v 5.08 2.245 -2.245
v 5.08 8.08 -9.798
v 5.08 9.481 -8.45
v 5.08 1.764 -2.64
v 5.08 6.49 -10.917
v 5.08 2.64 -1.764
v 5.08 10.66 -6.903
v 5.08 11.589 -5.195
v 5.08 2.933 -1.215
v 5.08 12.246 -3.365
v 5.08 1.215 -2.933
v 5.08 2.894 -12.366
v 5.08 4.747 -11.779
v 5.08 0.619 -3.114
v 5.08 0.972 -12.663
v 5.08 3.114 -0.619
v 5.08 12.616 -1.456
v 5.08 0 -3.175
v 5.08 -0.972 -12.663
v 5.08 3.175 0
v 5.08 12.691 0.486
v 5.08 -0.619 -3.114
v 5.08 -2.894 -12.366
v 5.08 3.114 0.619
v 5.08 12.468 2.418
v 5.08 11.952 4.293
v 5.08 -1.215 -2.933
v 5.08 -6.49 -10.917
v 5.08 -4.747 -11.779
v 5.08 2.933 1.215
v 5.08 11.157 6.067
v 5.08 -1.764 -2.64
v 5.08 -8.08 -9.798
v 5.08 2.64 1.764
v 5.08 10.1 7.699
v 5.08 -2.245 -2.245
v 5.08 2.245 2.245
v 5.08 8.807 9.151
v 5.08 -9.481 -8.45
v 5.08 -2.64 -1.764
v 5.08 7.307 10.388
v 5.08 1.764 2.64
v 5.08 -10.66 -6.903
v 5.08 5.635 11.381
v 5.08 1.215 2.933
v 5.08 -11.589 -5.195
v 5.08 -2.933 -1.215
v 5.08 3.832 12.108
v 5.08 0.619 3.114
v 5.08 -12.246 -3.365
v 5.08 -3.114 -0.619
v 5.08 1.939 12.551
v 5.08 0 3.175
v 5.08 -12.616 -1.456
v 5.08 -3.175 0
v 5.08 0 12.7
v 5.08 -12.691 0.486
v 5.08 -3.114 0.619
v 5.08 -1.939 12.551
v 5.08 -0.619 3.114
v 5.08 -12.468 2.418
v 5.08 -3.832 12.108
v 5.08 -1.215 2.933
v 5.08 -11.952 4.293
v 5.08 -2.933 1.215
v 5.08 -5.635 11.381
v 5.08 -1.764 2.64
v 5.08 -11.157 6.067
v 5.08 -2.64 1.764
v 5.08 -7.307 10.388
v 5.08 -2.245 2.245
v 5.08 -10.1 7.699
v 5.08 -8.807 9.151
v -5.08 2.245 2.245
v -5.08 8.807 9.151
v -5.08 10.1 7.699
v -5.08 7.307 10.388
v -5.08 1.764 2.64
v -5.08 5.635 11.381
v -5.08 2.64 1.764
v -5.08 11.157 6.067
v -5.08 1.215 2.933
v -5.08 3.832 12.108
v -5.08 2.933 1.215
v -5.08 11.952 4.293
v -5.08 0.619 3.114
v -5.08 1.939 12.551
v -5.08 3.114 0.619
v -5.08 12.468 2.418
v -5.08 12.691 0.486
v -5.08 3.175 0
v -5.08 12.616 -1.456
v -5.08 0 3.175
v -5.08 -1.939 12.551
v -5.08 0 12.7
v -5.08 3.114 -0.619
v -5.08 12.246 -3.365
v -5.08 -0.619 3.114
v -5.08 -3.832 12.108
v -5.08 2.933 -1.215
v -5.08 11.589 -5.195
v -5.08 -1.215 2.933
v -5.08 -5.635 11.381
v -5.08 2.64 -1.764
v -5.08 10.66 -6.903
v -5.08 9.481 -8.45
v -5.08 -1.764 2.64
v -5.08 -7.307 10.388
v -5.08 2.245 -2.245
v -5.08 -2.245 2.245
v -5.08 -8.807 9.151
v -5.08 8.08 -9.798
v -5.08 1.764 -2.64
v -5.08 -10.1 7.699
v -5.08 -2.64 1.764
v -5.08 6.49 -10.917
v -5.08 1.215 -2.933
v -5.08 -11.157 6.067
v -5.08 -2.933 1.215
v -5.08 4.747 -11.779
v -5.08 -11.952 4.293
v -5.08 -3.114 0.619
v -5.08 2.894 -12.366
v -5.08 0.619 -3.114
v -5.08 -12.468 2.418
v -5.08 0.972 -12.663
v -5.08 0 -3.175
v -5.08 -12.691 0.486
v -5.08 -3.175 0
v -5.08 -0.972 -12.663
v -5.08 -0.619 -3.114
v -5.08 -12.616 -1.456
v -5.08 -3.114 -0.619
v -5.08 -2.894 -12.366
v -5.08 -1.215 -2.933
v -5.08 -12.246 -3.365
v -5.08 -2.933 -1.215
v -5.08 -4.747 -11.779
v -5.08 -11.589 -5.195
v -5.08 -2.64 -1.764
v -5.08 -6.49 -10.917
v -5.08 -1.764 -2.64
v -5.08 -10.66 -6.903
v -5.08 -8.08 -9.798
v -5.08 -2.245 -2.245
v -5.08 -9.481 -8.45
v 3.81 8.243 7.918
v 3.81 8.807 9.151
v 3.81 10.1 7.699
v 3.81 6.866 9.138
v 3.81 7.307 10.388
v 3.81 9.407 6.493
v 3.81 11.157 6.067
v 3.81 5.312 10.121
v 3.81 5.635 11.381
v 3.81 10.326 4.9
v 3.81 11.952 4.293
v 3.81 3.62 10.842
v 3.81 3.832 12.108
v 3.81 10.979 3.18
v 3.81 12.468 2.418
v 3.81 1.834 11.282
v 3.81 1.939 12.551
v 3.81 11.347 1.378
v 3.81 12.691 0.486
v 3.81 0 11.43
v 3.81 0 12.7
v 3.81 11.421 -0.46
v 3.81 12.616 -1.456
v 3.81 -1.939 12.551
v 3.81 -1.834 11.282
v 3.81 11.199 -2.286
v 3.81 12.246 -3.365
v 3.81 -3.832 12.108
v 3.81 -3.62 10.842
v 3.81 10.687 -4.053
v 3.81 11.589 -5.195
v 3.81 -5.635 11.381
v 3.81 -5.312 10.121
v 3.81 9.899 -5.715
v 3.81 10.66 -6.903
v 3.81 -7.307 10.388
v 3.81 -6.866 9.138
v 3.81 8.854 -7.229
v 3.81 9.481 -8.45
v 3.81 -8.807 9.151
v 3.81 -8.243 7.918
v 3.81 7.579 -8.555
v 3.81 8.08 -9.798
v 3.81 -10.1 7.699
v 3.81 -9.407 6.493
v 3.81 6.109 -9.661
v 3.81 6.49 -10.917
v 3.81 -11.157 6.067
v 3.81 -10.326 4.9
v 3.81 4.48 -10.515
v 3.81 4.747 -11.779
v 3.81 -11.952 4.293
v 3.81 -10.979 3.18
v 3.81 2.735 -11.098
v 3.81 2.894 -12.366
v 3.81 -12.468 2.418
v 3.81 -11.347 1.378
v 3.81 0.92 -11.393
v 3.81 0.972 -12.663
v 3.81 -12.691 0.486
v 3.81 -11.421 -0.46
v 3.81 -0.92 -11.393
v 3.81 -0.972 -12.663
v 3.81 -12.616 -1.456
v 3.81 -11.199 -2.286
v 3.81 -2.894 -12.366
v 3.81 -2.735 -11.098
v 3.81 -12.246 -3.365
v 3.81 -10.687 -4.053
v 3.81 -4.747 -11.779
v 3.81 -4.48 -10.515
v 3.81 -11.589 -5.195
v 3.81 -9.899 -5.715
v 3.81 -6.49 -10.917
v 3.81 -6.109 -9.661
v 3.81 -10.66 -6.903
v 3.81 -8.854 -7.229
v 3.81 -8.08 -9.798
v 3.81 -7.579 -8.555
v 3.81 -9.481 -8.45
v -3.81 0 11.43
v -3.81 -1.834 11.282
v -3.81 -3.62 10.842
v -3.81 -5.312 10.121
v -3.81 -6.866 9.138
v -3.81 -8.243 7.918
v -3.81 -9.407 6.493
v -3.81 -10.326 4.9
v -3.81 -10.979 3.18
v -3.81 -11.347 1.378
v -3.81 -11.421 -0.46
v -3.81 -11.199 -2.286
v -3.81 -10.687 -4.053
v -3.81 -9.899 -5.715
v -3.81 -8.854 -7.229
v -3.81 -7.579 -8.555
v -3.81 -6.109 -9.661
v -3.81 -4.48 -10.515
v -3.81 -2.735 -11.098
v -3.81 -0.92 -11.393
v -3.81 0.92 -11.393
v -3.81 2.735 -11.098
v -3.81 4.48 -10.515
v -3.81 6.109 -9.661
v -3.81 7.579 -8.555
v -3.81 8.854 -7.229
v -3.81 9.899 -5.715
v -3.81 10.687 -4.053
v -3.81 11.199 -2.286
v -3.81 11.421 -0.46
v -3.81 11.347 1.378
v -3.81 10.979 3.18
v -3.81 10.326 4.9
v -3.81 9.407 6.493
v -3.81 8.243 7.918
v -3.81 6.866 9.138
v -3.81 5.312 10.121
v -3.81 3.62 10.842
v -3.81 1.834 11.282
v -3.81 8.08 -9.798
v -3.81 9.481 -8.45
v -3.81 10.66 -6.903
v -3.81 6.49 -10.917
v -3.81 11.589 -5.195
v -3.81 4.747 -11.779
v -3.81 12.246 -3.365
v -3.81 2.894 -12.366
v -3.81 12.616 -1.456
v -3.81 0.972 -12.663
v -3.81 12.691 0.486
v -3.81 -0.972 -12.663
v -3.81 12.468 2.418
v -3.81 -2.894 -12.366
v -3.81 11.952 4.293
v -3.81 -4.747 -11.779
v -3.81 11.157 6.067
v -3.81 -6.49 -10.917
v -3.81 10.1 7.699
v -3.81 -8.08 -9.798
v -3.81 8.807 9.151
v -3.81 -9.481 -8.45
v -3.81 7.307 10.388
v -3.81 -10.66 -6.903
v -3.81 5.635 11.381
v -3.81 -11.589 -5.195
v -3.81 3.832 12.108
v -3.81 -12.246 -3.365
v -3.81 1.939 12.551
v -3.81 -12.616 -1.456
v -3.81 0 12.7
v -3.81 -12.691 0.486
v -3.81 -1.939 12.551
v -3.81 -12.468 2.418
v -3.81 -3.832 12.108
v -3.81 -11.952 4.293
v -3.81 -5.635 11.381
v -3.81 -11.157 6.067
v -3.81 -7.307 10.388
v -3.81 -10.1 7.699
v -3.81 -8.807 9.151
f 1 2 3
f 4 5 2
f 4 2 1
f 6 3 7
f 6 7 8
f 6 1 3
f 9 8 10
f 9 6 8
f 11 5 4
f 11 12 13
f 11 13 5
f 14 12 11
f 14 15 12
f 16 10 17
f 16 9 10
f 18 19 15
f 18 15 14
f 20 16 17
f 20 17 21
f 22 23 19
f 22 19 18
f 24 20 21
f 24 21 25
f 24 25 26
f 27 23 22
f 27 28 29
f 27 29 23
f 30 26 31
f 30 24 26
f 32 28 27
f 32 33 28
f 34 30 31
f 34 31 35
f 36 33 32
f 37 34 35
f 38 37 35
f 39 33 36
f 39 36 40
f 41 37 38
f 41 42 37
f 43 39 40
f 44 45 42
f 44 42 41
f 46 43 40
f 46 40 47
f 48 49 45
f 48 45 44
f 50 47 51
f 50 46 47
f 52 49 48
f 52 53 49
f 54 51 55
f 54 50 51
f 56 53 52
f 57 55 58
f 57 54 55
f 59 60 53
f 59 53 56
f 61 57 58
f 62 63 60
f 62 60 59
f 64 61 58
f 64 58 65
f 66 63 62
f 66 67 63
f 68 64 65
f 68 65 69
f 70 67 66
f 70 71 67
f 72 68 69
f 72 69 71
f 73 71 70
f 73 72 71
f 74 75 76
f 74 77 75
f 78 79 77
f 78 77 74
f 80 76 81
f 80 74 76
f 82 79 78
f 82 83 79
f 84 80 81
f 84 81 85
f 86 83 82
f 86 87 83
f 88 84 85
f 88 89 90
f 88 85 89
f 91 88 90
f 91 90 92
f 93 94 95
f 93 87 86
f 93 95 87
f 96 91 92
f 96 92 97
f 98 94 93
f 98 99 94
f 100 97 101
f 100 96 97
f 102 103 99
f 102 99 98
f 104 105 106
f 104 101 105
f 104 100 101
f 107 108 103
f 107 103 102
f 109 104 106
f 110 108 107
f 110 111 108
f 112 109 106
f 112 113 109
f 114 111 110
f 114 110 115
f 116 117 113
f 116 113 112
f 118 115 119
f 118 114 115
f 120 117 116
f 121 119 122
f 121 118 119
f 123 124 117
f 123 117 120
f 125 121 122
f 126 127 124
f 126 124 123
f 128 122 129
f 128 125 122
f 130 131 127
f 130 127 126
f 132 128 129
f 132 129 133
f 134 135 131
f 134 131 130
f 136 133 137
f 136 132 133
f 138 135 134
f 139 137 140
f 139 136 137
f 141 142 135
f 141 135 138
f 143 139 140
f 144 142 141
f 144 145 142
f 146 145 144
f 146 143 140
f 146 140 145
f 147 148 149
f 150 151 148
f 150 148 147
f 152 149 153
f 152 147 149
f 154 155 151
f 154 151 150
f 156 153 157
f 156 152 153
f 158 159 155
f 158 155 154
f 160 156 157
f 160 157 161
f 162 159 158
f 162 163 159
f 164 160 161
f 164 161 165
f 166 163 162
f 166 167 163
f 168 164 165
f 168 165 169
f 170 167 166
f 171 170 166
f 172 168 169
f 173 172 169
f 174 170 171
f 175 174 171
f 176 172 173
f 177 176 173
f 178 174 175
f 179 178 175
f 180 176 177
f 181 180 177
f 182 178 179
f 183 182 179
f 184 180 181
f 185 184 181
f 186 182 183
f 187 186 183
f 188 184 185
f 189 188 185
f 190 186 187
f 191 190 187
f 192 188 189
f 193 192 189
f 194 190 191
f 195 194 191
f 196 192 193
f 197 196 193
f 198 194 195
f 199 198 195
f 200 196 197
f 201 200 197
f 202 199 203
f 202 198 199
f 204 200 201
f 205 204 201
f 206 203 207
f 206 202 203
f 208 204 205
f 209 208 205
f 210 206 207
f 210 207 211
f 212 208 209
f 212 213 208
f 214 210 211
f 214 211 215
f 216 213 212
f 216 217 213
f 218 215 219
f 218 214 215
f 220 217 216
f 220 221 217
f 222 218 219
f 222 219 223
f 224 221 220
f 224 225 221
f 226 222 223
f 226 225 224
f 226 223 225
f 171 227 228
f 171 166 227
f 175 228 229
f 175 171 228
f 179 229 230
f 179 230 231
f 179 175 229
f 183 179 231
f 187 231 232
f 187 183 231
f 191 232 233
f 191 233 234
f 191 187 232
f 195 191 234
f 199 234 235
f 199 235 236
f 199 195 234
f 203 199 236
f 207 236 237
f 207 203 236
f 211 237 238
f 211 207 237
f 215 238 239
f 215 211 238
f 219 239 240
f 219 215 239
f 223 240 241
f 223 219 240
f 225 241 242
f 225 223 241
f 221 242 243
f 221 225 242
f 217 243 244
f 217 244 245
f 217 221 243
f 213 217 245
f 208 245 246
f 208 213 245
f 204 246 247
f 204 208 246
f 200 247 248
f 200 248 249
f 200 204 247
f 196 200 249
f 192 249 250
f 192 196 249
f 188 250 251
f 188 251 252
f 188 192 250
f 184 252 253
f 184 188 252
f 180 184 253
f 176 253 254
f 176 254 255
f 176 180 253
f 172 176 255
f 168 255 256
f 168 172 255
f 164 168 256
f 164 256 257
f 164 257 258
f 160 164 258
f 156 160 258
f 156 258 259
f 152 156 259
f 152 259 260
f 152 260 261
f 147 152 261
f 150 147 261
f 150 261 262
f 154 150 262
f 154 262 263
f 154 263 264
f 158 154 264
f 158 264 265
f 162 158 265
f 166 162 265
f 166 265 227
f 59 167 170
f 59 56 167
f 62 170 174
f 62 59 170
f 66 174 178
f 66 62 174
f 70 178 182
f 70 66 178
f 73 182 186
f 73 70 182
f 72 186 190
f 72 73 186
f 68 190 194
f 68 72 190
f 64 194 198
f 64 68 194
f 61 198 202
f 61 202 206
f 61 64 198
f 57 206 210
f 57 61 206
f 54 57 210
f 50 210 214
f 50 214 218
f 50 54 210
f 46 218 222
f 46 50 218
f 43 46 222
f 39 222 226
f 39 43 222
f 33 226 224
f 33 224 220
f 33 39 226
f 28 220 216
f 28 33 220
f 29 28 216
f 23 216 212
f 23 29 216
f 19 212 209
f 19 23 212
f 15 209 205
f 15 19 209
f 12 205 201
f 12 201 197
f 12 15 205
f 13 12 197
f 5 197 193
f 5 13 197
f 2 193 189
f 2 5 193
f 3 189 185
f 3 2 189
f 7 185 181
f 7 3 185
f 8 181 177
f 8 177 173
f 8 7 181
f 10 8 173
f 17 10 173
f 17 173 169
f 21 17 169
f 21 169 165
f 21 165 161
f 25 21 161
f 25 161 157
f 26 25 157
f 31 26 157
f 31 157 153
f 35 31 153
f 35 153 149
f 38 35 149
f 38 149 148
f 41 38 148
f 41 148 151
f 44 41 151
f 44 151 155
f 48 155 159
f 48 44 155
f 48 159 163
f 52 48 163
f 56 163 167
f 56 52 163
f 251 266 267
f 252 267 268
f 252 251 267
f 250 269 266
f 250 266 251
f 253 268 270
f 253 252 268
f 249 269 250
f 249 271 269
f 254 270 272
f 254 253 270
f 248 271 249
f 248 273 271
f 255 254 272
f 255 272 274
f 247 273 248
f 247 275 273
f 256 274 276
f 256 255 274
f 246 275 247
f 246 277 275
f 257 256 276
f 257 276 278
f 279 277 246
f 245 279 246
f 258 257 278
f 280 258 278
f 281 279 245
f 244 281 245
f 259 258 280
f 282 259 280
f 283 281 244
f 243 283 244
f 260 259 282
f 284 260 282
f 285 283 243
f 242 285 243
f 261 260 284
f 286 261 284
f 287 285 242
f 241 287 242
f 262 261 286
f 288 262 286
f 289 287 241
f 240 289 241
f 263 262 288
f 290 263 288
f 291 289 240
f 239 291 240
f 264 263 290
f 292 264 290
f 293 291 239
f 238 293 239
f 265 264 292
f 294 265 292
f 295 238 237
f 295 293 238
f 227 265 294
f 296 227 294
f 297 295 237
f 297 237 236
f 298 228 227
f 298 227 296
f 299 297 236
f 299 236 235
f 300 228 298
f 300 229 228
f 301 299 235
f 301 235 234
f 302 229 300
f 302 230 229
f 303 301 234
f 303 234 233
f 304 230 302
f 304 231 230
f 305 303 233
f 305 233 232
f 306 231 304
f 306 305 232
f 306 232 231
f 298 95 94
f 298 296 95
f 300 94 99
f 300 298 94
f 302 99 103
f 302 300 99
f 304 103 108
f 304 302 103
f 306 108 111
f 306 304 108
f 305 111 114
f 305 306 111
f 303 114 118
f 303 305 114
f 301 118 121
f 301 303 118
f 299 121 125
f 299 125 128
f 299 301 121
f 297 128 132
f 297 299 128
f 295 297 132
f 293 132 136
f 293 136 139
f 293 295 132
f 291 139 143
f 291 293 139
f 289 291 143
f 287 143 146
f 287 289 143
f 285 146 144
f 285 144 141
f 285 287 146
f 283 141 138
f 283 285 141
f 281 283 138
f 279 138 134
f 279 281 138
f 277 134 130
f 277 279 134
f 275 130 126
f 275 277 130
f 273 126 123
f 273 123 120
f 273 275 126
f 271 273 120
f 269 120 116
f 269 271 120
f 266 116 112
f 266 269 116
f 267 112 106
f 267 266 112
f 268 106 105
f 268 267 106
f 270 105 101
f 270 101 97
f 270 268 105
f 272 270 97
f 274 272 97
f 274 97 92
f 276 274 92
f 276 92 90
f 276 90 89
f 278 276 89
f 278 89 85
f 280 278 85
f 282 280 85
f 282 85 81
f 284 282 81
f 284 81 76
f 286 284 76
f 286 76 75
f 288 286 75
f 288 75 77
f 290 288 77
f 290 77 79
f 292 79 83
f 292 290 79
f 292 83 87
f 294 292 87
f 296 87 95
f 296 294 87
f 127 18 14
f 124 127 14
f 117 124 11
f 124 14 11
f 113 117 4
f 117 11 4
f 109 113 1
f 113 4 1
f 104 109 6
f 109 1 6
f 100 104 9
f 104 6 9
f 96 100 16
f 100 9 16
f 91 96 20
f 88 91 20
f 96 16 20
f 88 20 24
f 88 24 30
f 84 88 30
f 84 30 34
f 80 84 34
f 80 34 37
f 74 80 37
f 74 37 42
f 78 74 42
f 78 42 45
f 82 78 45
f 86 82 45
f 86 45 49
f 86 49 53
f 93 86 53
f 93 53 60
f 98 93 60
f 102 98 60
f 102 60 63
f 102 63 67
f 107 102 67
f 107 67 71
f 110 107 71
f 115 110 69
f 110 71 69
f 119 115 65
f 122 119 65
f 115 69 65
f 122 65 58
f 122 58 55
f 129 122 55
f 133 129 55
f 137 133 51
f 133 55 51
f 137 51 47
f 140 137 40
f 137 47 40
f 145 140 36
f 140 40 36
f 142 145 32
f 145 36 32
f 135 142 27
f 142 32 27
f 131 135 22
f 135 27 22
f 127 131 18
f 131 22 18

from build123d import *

# Parameters (mm, degrees)
CUT_EXTRUDE1_REACH = 22.635
SKETCH3_R          = 3.175


with BuildPart() as part:
    # Sketch2 → Revolve1 (revolve)
    with BuildSketch(Plane.XY, mode=Mode.PRIVATE) as revolve1_sk:
        Polygon((5.08, 0), (-5.08, 0), (-5.08, 12.7), (-3.81, 12.7), (-3.81, 11.43), (3.81, 11.43), (3.81, 12.7), (5.08, 12.7), align=None)
    revolve(revolve1_sk.sketch.rotate(Axis((-12.271623249, 0, 0), (1, 0, 0)), 90), axis=Axis((-12.271623249, 0, 0), (1, 0, 0)))

    # Sketch3 → Cut-Extrude1 (cut, up to next)
    with BuildSketch(Plane(origin=(5.08, 0, 0), x_dir=(0, 0, -1), z_dir=(1, 0, 0)), mode=Mode.PRIVATE) as cut_extrude1_sk1:
        Circle(SKETCH3_R)
    cut_extrude1_tool1 = extrude(cut_extrude1_sk1.sketch, amount=-CUT_EXTRUDE1_REACH, mode=Mode.PRIVATE) & part.part
    add(cut_extrude1_tool1.solids().sort_by_distance((5.08, 0, 0))[0], mode=Mode.SUBTRACT)


solid = part.part
